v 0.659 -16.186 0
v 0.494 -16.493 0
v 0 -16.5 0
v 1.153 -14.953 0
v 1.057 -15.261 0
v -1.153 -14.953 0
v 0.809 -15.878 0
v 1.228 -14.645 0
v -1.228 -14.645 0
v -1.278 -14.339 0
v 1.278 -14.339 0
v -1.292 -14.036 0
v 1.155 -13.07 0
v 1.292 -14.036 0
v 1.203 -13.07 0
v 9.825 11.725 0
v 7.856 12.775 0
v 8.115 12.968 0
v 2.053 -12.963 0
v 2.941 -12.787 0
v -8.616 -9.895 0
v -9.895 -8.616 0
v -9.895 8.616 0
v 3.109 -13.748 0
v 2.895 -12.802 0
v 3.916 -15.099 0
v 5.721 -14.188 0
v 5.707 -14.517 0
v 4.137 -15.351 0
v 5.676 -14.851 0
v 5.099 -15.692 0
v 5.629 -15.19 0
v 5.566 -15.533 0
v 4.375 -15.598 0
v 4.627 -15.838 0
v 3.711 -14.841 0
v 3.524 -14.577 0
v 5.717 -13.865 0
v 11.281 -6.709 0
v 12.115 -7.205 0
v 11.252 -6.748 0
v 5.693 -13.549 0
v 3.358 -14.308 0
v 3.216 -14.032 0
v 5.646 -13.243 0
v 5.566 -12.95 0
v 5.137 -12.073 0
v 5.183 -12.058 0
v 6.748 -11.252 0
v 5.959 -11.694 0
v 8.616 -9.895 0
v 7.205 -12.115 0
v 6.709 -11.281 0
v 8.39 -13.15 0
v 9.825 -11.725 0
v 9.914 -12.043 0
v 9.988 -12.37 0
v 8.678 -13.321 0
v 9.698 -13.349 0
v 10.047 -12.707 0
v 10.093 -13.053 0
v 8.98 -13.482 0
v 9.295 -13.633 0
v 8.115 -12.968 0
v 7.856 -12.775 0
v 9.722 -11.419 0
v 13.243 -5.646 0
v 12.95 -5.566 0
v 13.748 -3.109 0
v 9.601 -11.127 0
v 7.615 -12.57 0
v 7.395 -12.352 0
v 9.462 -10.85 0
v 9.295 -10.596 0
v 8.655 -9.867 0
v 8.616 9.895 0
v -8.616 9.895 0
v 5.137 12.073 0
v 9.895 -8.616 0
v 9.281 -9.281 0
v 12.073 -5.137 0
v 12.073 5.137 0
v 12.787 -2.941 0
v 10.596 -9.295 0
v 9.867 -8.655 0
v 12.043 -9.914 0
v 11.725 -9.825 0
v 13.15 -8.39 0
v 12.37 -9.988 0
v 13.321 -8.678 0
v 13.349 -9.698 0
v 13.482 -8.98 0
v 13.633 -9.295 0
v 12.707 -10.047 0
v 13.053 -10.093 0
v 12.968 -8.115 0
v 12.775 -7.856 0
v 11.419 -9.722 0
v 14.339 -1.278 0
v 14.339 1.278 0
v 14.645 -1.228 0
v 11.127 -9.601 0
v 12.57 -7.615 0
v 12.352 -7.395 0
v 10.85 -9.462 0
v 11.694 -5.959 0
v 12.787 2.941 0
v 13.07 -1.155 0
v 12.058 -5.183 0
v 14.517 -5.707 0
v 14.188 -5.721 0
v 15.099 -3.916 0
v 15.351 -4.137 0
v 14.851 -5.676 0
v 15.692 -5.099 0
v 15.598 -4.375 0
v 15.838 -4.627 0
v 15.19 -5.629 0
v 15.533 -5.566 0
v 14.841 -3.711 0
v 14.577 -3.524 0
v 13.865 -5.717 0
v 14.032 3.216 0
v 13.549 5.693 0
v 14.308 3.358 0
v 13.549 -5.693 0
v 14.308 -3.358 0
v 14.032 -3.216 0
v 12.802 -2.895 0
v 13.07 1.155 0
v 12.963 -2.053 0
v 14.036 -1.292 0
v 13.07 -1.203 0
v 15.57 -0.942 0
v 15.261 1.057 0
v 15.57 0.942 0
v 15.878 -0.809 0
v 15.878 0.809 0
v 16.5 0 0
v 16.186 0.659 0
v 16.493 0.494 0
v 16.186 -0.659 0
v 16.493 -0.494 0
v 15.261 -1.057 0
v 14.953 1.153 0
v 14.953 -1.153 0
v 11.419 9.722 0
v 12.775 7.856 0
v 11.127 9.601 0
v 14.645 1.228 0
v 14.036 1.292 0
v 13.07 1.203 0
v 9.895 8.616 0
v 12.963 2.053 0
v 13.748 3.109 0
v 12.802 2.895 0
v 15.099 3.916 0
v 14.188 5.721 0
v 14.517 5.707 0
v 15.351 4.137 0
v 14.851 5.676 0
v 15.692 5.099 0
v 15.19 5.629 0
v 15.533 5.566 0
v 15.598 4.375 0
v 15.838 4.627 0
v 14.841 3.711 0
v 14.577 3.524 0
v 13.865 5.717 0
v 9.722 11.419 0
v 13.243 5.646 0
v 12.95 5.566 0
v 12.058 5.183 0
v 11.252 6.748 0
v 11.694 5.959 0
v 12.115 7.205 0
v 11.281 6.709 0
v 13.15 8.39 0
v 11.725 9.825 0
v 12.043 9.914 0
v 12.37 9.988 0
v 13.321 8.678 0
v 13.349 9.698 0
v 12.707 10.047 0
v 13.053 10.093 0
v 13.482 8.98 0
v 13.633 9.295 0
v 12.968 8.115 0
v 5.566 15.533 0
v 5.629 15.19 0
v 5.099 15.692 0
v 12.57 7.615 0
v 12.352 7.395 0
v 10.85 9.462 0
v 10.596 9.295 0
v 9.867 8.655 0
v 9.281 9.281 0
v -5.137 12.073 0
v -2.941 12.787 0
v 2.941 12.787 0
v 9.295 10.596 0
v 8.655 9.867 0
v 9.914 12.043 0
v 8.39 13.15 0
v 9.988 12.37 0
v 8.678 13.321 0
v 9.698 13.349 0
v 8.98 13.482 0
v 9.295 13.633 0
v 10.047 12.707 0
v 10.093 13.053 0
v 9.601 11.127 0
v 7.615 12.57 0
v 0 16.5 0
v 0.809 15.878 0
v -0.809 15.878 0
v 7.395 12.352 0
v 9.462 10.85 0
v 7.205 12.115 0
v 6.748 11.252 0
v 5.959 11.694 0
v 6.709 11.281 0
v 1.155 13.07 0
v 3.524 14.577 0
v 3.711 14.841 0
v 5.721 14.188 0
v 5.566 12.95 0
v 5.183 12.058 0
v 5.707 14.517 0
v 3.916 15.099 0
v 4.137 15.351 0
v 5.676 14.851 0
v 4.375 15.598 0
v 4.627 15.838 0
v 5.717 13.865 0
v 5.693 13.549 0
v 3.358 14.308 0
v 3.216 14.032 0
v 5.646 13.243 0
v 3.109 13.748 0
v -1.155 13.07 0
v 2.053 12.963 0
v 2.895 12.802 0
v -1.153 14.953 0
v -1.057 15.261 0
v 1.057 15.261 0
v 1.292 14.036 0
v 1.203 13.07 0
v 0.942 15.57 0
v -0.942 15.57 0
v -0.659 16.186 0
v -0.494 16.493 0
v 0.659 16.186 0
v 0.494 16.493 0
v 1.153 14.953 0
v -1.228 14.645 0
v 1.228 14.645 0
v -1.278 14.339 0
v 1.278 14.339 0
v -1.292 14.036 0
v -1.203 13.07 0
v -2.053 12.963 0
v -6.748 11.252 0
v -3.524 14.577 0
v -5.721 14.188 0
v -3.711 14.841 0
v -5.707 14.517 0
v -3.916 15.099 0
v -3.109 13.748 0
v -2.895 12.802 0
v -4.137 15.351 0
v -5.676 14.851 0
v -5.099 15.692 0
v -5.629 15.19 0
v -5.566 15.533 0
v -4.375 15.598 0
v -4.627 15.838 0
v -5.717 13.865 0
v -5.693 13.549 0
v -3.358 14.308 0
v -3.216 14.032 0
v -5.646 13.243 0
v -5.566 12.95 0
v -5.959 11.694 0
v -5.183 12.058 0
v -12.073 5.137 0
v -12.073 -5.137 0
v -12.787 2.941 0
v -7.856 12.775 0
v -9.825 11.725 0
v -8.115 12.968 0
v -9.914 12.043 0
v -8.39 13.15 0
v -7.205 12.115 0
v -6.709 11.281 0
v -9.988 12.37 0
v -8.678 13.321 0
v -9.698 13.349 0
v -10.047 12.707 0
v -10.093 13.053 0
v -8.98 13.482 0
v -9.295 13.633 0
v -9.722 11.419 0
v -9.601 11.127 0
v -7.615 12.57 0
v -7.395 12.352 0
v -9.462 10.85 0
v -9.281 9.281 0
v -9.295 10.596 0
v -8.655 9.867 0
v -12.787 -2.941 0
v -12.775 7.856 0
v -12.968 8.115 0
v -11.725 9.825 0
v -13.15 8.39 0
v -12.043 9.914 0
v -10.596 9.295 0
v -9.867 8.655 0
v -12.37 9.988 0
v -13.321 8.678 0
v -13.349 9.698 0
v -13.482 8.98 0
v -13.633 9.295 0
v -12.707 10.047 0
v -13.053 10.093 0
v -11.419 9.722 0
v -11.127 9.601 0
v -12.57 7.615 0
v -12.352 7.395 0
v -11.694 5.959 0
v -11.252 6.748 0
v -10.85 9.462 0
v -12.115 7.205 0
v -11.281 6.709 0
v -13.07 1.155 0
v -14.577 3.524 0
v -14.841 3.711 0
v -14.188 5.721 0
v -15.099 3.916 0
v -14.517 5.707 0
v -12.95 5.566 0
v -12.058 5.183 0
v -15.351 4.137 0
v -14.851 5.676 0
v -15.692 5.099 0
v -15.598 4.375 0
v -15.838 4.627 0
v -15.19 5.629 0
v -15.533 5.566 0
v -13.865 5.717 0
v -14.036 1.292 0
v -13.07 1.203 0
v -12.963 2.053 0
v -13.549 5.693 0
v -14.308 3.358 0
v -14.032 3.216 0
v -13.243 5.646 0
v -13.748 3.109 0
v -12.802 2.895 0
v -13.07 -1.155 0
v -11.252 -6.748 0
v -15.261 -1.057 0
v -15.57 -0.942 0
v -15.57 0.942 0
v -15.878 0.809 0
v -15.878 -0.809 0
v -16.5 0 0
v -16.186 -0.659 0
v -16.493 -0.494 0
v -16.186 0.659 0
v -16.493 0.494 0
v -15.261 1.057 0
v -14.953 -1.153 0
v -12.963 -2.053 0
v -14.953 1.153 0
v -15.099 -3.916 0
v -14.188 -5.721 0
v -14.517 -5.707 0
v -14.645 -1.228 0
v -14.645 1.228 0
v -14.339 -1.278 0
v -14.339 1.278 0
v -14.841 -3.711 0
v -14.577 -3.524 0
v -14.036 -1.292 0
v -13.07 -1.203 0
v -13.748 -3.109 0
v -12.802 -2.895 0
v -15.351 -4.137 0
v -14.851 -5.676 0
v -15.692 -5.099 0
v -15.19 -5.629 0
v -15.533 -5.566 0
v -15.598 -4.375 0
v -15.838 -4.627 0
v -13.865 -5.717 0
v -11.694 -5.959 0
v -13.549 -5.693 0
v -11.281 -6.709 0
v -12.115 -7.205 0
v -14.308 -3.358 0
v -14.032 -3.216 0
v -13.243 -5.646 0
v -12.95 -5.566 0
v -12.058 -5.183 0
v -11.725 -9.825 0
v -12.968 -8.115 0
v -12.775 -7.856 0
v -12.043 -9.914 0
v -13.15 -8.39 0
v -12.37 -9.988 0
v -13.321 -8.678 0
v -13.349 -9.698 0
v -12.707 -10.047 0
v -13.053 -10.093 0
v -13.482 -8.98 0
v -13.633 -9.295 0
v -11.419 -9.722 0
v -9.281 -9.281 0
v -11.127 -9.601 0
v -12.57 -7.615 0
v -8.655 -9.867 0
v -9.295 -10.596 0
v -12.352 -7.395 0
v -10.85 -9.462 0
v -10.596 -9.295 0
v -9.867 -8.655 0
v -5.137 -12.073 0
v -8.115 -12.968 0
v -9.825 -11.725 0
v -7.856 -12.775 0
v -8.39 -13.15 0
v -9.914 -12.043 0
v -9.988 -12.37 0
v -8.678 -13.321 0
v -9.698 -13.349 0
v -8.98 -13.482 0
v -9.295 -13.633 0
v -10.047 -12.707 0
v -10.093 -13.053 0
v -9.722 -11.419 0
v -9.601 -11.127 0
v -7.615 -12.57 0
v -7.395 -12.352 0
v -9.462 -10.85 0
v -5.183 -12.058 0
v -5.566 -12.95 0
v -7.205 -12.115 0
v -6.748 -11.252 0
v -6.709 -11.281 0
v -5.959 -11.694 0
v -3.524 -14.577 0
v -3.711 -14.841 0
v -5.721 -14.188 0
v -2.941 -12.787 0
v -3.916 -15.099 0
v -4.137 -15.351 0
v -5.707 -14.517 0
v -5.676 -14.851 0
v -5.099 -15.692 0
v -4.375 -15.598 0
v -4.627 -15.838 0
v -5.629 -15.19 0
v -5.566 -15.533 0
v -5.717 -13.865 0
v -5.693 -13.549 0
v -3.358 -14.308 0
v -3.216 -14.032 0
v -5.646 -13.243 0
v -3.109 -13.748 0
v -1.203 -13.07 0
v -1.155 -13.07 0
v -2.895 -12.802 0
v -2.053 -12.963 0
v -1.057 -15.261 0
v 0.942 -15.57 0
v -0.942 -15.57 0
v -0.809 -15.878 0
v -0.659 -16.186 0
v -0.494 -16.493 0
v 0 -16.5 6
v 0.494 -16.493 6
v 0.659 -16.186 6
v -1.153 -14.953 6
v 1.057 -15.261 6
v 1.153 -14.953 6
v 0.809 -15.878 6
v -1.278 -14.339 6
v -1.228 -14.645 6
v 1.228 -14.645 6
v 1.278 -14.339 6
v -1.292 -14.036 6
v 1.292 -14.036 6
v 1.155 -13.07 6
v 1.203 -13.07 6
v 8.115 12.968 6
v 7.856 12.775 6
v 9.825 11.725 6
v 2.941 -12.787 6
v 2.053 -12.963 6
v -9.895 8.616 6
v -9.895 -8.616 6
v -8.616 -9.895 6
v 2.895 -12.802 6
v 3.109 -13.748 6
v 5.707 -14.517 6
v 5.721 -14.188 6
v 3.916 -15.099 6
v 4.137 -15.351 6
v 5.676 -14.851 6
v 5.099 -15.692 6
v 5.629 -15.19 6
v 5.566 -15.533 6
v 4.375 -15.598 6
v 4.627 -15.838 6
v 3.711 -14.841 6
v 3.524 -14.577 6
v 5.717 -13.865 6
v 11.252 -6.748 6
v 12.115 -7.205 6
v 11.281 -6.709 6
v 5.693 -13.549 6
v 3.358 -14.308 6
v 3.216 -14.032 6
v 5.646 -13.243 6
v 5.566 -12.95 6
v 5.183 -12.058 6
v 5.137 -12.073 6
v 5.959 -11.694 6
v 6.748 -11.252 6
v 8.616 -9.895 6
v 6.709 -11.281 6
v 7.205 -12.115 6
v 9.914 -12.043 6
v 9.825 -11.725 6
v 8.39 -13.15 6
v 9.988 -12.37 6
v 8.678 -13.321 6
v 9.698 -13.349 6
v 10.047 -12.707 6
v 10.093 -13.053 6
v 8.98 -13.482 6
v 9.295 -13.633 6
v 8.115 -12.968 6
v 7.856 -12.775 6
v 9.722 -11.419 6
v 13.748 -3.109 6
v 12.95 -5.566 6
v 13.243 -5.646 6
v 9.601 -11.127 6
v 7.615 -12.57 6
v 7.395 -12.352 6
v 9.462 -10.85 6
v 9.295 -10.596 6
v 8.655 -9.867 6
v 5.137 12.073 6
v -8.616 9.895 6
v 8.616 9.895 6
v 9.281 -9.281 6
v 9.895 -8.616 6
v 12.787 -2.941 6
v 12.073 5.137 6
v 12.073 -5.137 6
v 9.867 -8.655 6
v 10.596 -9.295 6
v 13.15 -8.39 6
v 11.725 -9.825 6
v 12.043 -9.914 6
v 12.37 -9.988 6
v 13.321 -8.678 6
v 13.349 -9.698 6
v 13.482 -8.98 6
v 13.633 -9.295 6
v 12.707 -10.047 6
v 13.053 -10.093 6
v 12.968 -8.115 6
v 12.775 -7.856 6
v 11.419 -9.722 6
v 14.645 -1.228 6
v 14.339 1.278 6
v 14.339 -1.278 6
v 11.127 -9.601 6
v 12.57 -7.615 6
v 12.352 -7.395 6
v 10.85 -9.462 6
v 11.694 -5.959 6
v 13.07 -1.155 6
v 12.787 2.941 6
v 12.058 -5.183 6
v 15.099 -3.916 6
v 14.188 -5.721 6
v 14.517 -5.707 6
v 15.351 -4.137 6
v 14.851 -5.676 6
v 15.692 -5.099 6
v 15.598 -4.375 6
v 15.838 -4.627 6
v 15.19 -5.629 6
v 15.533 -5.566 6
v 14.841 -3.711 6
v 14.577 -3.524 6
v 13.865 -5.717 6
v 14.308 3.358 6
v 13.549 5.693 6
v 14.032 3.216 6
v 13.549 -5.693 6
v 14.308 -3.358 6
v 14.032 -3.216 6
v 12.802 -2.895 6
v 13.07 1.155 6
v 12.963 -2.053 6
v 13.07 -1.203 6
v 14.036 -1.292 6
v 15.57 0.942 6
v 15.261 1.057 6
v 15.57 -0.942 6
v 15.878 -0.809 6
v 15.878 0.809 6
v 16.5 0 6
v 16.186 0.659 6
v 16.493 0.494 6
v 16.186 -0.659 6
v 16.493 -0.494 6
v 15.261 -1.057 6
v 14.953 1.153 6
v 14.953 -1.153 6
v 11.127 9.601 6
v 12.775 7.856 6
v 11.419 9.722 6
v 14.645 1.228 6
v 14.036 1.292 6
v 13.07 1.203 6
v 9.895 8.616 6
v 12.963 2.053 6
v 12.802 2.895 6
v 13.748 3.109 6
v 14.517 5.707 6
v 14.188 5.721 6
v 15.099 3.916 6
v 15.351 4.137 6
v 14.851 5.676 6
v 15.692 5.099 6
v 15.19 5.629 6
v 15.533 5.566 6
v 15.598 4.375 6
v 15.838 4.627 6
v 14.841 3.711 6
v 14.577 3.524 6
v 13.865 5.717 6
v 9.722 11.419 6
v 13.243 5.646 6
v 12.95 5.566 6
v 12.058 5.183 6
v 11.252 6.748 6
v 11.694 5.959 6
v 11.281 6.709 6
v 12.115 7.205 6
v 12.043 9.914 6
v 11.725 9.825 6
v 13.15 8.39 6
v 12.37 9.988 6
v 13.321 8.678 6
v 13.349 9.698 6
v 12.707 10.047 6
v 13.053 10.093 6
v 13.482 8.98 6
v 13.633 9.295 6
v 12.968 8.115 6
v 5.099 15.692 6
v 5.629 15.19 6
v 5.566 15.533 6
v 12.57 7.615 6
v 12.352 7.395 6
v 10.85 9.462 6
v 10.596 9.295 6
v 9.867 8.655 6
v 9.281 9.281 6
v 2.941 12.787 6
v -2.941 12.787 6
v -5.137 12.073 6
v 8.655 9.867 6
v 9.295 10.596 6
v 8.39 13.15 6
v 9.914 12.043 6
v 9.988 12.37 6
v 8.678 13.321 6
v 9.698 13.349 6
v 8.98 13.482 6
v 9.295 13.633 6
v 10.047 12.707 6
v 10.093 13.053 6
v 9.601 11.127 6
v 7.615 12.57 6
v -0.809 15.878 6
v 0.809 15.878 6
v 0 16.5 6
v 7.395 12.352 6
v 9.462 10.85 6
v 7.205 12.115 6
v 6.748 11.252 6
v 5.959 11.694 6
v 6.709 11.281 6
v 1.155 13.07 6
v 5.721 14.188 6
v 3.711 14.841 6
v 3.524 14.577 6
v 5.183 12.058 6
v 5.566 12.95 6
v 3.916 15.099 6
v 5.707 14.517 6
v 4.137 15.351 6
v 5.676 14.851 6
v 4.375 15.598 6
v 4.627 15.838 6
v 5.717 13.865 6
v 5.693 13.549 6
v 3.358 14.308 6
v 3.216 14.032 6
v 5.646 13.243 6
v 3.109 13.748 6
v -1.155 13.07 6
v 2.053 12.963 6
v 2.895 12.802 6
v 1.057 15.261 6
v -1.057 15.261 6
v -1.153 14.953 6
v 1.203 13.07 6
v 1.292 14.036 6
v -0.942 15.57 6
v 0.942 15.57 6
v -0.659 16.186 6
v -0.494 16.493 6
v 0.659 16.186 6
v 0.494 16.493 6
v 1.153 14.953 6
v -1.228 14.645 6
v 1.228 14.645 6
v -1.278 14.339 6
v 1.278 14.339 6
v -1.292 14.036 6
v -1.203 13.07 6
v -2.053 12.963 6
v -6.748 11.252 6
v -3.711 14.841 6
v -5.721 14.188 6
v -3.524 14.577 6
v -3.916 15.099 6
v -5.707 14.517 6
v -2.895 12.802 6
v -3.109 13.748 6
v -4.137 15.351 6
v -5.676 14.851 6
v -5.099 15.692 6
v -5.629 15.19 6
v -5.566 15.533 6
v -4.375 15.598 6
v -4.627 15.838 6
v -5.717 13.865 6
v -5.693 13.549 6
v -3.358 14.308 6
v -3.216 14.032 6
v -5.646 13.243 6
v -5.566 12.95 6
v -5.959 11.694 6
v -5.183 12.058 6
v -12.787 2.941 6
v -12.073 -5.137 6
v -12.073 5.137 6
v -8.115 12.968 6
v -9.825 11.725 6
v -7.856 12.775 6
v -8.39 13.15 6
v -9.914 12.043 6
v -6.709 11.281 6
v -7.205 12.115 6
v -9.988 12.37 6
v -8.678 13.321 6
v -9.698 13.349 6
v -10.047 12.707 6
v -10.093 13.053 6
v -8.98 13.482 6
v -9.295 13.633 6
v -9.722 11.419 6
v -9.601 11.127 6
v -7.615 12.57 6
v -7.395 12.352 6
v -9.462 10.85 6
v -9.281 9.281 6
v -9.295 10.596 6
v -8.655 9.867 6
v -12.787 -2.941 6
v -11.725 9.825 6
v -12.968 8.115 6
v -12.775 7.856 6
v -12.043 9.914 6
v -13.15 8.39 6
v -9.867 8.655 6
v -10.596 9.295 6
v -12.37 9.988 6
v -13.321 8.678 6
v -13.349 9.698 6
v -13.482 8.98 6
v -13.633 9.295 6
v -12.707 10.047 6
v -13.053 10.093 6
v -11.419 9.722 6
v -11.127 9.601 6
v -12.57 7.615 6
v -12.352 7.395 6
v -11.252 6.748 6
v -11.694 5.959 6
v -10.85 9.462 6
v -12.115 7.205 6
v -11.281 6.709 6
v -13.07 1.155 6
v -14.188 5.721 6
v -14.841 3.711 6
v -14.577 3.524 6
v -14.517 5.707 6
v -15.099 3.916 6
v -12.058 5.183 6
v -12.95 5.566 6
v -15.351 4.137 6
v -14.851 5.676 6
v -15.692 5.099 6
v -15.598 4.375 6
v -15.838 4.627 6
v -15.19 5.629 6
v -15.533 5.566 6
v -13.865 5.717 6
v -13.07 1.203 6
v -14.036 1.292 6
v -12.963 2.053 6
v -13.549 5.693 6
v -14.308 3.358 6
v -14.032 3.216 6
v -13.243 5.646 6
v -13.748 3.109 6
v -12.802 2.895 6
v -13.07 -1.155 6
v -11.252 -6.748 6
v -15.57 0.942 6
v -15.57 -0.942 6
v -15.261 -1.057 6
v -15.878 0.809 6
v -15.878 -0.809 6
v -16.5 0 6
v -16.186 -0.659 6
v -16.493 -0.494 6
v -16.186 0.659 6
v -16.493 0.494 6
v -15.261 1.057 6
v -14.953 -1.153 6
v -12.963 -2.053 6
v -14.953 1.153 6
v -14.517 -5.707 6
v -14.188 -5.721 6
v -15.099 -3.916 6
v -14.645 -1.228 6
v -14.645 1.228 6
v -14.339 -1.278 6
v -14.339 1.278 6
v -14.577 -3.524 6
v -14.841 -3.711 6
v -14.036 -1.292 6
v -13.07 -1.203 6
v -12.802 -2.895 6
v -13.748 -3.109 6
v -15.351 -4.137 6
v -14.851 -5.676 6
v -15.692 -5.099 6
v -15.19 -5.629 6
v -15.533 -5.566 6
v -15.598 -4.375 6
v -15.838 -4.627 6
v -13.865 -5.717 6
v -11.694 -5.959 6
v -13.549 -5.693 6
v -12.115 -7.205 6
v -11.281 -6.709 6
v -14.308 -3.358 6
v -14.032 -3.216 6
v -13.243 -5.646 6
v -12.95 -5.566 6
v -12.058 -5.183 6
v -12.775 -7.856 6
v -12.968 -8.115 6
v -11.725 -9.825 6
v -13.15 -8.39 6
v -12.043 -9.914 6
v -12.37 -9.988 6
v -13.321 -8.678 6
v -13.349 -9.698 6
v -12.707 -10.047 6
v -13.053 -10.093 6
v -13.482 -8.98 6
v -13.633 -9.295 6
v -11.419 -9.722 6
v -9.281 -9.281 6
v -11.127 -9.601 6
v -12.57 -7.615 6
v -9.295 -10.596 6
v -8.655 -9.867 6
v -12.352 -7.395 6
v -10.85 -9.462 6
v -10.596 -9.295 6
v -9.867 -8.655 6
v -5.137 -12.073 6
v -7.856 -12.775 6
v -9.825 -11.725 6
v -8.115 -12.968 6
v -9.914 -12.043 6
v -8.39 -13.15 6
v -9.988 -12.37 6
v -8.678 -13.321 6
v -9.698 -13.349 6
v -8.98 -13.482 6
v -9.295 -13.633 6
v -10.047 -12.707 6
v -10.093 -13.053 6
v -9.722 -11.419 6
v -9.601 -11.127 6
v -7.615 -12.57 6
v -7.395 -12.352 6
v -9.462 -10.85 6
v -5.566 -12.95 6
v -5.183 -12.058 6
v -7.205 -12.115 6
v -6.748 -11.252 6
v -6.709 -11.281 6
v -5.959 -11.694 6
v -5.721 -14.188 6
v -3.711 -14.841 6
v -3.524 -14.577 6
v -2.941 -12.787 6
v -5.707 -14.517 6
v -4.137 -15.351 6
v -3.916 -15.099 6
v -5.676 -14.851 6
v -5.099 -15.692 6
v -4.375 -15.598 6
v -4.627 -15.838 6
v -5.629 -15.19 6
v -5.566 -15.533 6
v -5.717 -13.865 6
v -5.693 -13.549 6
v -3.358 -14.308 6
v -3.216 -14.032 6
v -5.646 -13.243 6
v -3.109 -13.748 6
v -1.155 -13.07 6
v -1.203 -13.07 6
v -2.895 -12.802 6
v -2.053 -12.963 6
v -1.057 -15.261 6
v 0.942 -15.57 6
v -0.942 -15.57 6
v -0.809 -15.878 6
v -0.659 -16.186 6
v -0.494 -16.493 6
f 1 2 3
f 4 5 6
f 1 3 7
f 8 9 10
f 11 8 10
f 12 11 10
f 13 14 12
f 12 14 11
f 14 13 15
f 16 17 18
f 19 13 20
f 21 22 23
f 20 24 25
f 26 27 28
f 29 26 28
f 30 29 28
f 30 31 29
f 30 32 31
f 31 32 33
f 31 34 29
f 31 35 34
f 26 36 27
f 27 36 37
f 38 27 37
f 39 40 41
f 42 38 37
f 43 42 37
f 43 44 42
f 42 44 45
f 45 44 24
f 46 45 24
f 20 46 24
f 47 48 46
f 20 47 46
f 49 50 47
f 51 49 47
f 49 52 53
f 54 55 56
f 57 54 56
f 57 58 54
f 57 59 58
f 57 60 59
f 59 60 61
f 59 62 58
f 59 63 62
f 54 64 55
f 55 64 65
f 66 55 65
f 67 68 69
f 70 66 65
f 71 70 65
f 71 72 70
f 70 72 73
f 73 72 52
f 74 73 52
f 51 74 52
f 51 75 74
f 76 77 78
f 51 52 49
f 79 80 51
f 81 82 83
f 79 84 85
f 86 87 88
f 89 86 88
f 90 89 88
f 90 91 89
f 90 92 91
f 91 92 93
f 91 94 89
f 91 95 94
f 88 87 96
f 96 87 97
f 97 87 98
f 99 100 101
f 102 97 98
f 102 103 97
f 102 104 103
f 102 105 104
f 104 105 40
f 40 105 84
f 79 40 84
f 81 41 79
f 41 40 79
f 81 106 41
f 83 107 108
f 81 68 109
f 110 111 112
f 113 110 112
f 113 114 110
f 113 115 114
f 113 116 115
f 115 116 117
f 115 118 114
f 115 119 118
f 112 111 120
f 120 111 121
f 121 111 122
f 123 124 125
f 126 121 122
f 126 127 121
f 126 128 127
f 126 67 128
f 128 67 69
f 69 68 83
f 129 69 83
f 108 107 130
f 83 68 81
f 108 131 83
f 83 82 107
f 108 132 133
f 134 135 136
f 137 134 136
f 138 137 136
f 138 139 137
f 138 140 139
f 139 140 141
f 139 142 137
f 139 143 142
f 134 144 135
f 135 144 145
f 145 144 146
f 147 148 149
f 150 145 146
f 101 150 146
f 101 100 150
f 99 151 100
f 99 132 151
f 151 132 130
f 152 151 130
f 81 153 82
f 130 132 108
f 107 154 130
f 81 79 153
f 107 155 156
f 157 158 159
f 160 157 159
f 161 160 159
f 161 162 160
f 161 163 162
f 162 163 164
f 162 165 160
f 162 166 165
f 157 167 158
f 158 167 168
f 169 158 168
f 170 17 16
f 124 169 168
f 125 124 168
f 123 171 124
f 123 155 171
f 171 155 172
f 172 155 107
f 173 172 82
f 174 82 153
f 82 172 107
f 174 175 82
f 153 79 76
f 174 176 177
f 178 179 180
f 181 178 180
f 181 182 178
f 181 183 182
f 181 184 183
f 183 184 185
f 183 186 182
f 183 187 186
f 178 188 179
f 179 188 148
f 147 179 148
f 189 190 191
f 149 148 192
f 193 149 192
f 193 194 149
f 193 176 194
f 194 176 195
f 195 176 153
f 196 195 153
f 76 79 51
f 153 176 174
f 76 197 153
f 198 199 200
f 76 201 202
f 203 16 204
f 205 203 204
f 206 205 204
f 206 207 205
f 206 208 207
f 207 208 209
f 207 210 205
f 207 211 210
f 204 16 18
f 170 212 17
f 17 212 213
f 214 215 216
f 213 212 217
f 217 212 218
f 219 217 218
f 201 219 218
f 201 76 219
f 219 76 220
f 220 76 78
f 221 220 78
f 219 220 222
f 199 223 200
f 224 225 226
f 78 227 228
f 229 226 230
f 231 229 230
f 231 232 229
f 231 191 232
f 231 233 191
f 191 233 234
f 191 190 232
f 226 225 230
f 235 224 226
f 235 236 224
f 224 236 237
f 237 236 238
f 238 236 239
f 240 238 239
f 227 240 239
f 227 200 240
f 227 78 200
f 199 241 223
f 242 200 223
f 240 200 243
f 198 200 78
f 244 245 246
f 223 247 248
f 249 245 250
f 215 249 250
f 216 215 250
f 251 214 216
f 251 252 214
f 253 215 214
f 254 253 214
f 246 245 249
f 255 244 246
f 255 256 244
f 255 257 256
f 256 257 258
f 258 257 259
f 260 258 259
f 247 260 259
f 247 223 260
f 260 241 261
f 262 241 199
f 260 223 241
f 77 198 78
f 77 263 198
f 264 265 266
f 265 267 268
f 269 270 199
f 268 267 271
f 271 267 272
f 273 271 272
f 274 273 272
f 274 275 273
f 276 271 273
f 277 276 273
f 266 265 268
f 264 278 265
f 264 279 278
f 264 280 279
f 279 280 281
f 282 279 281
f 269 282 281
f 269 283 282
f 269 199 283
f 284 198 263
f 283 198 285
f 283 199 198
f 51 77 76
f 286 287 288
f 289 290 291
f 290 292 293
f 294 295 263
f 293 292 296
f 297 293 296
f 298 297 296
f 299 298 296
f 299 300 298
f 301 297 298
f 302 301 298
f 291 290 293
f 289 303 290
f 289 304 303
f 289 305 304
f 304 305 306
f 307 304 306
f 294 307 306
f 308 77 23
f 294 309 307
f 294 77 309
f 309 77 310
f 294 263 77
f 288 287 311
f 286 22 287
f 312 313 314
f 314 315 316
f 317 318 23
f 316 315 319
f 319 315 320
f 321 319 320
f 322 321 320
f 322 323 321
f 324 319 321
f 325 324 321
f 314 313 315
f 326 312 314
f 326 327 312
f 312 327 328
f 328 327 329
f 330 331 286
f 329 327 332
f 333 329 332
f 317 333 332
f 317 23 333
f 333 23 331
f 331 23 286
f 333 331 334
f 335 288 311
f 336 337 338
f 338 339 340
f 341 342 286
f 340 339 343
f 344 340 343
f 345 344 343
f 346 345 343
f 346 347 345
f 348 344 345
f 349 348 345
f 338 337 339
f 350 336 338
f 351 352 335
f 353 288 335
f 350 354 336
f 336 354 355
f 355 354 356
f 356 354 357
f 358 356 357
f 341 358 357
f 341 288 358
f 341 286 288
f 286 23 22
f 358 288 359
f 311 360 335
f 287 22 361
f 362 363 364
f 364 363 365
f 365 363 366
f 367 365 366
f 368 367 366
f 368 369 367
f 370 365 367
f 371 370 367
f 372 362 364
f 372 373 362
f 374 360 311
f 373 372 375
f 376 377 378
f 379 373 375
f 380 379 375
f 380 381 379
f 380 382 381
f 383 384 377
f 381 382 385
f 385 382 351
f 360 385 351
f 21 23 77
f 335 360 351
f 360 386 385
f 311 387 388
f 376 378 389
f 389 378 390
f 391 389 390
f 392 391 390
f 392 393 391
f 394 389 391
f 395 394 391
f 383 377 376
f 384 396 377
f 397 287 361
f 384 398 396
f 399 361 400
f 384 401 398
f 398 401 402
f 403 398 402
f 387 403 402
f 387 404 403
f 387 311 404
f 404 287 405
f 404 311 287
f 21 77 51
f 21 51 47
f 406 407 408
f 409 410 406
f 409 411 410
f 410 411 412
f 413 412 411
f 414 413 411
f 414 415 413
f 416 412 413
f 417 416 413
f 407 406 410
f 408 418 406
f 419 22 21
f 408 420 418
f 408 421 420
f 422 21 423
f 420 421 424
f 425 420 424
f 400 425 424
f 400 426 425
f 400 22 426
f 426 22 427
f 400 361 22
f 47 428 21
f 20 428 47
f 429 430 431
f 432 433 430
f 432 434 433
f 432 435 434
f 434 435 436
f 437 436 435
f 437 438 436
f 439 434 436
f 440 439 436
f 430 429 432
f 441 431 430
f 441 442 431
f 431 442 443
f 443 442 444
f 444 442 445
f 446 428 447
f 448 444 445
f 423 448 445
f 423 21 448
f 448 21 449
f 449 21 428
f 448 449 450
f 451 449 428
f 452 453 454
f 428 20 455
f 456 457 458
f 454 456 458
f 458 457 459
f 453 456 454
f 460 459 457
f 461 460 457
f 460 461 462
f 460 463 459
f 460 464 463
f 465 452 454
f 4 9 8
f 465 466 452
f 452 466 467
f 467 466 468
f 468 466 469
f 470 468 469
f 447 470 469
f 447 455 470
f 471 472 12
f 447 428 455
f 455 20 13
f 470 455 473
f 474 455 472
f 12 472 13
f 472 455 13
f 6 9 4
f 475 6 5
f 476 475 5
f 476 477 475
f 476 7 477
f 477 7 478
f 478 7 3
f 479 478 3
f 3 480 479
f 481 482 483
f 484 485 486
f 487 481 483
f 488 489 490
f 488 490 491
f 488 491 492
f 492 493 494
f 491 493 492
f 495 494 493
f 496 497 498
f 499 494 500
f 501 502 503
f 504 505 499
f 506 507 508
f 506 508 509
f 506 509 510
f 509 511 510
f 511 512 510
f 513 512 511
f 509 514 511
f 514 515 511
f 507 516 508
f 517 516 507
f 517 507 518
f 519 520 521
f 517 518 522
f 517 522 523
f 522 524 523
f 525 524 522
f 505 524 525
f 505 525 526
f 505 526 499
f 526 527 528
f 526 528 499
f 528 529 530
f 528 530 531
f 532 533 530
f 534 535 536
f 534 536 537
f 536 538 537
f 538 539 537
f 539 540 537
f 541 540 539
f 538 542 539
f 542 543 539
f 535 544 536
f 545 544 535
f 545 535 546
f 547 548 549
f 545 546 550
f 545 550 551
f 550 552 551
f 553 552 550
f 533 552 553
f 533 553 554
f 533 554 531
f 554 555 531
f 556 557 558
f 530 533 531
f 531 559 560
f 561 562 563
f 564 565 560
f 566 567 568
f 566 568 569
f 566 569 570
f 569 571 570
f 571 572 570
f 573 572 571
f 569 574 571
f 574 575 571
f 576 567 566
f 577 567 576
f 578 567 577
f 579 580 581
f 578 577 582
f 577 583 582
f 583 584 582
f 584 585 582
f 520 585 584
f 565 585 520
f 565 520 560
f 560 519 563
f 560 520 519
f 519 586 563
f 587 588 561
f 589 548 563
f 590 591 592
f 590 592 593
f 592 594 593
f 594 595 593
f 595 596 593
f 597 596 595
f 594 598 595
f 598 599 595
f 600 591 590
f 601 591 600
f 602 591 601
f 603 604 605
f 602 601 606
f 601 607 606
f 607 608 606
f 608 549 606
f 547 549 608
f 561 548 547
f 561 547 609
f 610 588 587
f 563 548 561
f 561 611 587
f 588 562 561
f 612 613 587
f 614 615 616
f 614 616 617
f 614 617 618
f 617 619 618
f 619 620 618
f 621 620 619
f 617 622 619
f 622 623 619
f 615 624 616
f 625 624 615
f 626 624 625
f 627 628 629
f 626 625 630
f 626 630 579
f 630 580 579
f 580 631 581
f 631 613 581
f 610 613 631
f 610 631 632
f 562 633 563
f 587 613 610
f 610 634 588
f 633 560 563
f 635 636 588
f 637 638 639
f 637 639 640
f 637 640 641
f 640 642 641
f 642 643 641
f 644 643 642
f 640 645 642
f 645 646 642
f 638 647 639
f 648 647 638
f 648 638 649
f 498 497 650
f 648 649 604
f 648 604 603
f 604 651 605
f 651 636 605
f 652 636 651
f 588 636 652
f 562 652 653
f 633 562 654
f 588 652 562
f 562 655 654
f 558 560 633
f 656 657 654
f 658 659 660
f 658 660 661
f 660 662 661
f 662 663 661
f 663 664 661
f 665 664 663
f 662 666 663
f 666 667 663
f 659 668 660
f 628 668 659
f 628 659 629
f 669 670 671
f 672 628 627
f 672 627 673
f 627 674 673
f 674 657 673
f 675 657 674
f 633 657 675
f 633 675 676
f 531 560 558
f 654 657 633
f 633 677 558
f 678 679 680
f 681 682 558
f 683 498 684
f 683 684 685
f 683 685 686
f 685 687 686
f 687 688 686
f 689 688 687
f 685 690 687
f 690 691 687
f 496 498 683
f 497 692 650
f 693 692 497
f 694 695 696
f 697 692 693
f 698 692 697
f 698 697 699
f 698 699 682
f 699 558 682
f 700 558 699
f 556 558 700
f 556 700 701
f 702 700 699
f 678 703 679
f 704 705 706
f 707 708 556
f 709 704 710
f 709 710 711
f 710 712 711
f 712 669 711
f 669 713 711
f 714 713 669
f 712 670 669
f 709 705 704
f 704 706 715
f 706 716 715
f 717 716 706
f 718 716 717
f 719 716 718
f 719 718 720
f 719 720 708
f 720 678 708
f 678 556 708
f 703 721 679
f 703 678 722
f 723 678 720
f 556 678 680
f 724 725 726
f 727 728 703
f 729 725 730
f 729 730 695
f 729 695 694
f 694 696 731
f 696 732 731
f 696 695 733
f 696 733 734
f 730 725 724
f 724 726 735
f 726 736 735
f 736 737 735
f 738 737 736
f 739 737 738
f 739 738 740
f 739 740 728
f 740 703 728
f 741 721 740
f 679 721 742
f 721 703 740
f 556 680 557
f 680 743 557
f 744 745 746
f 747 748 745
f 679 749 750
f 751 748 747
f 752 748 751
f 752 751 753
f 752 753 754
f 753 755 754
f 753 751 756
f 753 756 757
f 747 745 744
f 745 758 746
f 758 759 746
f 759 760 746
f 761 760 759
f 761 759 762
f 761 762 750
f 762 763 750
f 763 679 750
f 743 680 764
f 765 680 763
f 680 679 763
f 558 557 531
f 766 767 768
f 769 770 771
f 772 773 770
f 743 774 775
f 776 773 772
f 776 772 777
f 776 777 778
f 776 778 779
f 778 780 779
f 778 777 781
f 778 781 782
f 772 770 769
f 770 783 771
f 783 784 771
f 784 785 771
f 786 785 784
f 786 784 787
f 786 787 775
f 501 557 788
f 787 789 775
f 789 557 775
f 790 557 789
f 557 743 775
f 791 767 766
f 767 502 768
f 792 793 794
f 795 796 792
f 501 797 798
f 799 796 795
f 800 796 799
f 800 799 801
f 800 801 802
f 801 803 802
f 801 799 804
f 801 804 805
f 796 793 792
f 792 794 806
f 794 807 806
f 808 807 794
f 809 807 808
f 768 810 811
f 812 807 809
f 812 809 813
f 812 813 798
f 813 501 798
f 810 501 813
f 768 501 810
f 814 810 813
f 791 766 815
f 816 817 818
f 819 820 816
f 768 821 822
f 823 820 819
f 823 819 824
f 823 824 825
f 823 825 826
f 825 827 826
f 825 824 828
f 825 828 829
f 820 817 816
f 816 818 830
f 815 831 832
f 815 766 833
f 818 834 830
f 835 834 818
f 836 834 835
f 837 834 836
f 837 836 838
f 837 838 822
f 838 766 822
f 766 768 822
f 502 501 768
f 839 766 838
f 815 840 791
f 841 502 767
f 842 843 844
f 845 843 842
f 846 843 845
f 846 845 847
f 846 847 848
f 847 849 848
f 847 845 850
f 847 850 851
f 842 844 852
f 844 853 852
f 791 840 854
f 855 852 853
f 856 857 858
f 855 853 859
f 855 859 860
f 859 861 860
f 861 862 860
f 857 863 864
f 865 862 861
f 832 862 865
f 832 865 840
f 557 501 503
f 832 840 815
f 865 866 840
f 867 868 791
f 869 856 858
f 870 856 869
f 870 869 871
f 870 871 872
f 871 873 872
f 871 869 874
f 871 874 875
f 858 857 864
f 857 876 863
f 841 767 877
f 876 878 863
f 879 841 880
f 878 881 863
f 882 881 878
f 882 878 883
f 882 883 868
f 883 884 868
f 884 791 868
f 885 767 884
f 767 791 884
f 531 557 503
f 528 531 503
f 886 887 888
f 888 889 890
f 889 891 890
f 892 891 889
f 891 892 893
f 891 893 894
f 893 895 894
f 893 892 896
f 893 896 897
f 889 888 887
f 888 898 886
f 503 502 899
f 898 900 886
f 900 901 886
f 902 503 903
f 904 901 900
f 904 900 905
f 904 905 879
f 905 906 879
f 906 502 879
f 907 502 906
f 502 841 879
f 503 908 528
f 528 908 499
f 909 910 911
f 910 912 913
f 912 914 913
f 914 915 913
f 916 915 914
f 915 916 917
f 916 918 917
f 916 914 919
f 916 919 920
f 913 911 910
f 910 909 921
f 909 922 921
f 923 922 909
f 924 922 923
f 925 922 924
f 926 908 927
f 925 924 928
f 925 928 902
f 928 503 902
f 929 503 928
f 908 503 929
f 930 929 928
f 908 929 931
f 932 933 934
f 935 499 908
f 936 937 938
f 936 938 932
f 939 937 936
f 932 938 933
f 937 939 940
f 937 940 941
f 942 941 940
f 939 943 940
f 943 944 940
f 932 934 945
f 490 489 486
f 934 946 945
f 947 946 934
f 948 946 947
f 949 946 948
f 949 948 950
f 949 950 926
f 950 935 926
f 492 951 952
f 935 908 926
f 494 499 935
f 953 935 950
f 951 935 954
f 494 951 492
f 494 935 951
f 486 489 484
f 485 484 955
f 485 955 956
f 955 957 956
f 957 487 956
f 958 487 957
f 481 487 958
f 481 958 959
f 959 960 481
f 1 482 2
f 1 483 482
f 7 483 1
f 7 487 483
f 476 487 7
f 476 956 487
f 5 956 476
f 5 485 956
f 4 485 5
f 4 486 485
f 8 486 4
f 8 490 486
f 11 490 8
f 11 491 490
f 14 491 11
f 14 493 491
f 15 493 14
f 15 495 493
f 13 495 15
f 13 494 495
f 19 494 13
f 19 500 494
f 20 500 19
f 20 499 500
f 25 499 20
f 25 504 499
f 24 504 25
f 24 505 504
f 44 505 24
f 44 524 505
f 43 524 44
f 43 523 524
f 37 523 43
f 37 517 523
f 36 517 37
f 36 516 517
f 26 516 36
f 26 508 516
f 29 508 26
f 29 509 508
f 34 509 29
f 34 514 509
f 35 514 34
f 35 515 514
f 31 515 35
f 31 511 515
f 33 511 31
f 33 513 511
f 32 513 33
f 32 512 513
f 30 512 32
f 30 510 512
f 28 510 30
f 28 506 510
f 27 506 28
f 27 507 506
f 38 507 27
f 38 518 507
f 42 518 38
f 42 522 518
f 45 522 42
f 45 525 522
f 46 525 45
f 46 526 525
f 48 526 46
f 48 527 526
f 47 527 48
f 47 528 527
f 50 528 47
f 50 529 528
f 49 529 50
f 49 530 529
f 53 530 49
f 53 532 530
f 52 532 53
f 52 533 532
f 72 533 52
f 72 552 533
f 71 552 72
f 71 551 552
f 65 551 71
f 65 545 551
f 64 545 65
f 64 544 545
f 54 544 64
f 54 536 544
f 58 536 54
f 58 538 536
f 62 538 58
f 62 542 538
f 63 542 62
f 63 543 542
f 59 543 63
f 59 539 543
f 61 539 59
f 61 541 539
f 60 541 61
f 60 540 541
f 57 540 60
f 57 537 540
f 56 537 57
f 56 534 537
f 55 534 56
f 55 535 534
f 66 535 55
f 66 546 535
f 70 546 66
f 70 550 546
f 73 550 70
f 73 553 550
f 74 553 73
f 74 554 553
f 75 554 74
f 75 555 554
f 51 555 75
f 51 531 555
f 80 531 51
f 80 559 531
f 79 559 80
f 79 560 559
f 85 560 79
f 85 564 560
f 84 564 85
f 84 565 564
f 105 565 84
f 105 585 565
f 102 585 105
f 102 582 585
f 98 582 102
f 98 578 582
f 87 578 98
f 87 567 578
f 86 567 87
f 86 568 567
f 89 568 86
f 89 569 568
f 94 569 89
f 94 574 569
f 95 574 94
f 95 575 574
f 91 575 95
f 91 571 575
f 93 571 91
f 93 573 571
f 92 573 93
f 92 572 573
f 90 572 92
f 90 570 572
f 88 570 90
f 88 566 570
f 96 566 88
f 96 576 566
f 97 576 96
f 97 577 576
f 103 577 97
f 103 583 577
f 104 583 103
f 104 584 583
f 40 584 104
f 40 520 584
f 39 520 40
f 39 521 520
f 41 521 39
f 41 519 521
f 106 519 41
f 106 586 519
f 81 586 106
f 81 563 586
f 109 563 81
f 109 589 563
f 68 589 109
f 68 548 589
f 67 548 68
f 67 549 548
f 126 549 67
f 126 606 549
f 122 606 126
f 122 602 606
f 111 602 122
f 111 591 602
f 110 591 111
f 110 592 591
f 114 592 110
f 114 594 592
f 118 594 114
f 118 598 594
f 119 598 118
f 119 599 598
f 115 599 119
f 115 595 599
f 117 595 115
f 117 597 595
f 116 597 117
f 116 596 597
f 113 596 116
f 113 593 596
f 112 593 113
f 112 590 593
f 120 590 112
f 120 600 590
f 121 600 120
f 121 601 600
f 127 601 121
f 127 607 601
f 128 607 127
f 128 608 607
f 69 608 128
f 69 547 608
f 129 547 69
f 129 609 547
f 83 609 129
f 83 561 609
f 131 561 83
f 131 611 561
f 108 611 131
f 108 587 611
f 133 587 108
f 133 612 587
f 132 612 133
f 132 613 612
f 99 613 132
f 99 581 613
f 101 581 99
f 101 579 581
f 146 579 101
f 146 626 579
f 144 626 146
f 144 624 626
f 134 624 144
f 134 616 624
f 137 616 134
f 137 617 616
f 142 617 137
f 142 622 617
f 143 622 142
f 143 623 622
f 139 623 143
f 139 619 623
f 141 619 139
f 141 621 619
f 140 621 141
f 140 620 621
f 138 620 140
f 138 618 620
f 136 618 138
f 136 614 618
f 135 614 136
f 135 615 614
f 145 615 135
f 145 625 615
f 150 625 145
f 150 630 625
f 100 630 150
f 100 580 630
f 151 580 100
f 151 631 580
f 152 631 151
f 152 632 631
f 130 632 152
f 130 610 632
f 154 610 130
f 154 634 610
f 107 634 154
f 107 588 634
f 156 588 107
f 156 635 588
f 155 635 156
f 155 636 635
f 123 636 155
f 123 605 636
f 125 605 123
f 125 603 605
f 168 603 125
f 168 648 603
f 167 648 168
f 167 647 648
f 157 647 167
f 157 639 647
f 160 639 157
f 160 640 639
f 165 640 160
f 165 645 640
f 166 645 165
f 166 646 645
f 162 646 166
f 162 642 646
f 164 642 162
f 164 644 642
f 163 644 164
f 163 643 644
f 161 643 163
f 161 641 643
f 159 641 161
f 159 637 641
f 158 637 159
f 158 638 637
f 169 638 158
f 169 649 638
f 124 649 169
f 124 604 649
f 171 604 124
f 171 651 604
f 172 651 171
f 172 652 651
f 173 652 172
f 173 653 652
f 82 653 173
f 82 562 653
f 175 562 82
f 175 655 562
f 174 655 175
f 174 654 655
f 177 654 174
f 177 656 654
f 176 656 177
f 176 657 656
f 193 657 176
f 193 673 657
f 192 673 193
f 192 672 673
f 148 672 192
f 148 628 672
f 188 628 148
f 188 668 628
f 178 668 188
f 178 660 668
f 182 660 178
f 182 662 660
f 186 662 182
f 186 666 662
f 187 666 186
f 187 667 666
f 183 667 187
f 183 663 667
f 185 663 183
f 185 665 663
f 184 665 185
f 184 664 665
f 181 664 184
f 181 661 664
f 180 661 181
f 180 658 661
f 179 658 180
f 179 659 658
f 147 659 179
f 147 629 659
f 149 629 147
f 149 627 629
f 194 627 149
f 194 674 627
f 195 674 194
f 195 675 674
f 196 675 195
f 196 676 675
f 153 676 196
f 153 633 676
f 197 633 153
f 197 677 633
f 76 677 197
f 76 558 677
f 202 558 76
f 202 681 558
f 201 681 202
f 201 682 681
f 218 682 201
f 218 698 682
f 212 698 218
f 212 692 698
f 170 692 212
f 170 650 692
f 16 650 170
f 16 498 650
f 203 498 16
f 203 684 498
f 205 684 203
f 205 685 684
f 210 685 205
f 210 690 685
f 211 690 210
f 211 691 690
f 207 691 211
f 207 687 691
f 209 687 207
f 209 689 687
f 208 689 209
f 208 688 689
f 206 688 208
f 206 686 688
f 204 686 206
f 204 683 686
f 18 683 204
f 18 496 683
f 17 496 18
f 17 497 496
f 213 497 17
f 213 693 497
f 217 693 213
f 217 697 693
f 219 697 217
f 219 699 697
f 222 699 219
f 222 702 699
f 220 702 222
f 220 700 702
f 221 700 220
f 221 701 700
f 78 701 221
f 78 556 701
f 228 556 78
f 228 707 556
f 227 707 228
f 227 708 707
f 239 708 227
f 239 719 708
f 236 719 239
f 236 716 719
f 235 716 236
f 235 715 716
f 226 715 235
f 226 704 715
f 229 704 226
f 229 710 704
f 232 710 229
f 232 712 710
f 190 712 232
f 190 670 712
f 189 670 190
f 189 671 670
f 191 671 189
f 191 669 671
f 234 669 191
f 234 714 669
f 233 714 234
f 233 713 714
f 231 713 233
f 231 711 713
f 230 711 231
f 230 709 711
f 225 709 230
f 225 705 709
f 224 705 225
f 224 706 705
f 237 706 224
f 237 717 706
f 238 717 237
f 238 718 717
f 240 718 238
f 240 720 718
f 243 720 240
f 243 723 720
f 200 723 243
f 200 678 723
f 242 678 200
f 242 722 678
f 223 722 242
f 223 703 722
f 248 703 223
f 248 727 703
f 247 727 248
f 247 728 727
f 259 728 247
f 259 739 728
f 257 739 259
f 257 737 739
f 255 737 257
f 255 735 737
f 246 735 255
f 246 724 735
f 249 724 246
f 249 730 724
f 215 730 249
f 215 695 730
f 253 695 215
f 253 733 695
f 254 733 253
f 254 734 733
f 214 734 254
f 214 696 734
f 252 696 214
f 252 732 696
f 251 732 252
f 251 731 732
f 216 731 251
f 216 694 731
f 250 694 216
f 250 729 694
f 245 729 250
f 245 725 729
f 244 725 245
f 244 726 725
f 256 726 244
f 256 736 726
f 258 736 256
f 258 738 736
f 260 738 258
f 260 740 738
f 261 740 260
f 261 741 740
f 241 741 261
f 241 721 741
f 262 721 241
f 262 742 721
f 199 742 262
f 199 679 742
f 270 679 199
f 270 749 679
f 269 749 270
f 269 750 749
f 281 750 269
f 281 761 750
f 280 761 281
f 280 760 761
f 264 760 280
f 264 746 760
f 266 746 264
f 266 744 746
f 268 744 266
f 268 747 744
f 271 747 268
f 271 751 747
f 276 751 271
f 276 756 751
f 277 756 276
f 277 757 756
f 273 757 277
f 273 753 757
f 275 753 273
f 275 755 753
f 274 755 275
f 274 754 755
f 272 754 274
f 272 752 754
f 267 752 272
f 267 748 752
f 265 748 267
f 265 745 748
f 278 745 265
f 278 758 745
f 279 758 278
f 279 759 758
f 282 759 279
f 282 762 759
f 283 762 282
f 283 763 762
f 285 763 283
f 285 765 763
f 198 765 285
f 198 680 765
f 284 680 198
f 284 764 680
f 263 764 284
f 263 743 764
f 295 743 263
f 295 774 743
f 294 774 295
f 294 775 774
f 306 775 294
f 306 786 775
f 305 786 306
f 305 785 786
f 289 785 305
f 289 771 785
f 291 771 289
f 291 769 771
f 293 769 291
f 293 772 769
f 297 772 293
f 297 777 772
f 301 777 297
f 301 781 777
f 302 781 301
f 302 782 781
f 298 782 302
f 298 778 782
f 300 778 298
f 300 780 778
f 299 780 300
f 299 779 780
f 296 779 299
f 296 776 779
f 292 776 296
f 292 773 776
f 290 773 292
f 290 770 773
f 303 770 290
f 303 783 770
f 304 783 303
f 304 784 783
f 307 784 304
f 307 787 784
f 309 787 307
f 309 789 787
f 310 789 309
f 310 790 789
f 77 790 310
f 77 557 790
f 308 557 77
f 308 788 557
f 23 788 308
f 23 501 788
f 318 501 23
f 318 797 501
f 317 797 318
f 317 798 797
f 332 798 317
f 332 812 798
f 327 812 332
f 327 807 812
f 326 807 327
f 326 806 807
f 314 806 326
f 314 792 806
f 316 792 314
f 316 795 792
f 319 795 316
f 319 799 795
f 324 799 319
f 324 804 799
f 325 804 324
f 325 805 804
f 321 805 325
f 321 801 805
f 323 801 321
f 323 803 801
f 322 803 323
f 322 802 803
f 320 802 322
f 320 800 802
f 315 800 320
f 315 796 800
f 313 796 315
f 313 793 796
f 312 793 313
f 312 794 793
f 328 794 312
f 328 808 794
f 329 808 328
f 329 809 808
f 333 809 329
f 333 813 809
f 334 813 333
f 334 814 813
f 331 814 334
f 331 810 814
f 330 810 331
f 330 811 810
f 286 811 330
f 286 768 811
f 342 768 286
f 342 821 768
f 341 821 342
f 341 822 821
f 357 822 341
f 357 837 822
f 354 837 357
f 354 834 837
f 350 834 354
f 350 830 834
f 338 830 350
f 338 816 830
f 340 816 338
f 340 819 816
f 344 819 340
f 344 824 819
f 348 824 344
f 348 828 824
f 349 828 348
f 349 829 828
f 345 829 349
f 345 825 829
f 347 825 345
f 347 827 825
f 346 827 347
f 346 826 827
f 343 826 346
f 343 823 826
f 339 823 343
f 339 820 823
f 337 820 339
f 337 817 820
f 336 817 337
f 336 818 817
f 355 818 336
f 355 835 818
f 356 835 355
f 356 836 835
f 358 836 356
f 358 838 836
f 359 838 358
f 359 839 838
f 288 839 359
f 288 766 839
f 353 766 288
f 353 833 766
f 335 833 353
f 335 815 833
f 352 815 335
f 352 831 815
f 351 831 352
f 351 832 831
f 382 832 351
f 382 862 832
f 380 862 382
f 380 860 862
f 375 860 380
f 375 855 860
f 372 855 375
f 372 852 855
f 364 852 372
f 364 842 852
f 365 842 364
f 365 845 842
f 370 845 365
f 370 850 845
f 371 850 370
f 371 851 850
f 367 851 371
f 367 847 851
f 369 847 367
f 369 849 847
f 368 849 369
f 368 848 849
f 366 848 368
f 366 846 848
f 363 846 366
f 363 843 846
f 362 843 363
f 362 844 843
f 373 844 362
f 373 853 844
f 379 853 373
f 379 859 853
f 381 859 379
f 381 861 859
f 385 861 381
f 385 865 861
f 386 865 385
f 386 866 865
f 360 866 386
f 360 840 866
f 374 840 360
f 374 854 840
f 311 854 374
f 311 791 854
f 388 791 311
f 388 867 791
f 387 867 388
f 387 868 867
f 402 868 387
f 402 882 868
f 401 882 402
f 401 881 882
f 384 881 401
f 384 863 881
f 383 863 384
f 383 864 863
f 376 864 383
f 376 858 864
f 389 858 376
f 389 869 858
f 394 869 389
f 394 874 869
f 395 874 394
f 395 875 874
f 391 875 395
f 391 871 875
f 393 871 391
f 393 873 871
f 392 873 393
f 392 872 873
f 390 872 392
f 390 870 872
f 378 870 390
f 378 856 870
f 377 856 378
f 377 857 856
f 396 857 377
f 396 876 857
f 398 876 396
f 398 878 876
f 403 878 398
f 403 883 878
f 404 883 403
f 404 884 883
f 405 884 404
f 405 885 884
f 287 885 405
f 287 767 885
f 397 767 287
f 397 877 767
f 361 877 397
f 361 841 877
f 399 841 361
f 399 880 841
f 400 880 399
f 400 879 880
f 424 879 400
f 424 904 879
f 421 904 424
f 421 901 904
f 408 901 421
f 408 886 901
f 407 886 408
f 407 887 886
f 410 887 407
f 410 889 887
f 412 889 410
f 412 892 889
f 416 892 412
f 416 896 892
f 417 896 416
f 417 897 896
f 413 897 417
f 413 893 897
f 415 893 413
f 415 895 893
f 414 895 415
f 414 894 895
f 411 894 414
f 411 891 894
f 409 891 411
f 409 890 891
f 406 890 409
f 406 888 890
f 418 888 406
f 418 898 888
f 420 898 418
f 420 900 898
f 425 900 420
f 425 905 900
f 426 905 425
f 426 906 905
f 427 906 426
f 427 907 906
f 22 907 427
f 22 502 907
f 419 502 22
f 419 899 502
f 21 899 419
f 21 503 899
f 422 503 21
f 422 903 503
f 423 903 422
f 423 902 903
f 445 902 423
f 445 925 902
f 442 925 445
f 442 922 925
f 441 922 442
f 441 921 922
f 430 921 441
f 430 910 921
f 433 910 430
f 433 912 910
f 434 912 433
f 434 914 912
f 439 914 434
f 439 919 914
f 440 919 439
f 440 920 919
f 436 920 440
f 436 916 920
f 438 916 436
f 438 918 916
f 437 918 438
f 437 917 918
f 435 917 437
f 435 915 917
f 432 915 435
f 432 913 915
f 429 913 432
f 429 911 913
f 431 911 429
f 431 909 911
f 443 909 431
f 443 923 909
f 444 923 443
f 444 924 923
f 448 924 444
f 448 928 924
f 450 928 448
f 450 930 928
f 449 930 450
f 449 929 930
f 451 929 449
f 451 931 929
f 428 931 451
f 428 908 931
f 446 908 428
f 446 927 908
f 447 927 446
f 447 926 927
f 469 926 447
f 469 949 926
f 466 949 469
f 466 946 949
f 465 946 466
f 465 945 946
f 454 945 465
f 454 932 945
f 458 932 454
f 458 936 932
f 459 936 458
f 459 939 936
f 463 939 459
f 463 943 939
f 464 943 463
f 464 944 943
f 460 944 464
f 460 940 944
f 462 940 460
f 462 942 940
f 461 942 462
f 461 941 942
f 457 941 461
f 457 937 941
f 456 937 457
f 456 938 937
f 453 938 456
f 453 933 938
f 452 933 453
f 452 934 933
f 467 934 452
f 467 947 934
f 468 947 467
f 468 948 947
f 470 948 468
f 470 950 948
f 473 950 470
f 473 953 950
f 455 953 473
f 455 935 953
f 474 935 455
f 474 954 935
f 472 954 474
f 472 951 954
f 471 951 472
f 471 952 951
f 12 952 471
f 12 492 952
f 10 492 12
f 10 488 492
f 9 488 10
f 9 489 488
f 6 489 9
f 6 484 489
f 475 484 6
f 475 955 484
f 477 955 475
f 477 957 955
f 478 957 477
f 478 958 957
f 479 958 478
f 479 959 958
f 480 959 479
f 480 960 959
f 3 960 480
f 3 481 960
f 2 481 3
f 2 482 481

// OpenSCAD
// Spike 4's spur gear (docs/physics-plan.md): an involute gear drawn with the same formulas as spurGearTooth() in
// packages/contracts/src/spurGear.ts, so that tools/physics/check-physics.ts can compare that function's convex pieces with this
// render. Not a catalogue model. Millimetres; the gear lies on z = 0..WIDTH about the Z axis, tooth 0 centred on +X.
MODULE = 1.5;
TEETH = 20;
WIDTH = 6;
PRESSURE_ANGLE = 20;
BACKLASH = 0.05;   // each tooth thinned by this at the pitch circle
STEPS = 8;

PITCH = MODULE * TEETH / 2;
BASE = PITCH * cos(PRESSURE_ANGLE);
TIP = PITCH + MODULE;
ROOT = PITCH - 1.25 * MODULE;

// the involute function, in degrees: tan(phi) - phi
function inv(phi) = tan(phi) * 180 / PI - phi;
// half the tooth's angle at radius r (degrees)
function half(r) = 90 / TEETH - BACKLASH / (2 * PITCH) * 180 / PI + inv(PRESSURE_ANGLE) - inv(acos(min(1, BASE / r)));
START = max(BASE, ROOT);
RADII = [for (i = [0 : STEPS]) START + (TIP - START) * i / STEPS];
function flank(side) = [for (p = concat(ROOT < BASE ? [[ROOT, half(BASE)]] : [], [for (r = RADII) [r, half(r)]])) [p[0] * cos(side * p[1]), p[0] * sin(side * p[1])]];
function reverse(list) = [for (i = [len(list) - 1 : -1 : 0]) list[i]];
TOOTH = concat(flank(-1), [[TIP, 0]], reverse(flank(1)));

linear_extrude(height = WIDTH) union() {
  circle(r = ROOT, $fn = TEETH * 4);
  for (k = [0 : TEETH - 1]) rotate(360 * k / TEETH) polygon(TOOTH);
}
